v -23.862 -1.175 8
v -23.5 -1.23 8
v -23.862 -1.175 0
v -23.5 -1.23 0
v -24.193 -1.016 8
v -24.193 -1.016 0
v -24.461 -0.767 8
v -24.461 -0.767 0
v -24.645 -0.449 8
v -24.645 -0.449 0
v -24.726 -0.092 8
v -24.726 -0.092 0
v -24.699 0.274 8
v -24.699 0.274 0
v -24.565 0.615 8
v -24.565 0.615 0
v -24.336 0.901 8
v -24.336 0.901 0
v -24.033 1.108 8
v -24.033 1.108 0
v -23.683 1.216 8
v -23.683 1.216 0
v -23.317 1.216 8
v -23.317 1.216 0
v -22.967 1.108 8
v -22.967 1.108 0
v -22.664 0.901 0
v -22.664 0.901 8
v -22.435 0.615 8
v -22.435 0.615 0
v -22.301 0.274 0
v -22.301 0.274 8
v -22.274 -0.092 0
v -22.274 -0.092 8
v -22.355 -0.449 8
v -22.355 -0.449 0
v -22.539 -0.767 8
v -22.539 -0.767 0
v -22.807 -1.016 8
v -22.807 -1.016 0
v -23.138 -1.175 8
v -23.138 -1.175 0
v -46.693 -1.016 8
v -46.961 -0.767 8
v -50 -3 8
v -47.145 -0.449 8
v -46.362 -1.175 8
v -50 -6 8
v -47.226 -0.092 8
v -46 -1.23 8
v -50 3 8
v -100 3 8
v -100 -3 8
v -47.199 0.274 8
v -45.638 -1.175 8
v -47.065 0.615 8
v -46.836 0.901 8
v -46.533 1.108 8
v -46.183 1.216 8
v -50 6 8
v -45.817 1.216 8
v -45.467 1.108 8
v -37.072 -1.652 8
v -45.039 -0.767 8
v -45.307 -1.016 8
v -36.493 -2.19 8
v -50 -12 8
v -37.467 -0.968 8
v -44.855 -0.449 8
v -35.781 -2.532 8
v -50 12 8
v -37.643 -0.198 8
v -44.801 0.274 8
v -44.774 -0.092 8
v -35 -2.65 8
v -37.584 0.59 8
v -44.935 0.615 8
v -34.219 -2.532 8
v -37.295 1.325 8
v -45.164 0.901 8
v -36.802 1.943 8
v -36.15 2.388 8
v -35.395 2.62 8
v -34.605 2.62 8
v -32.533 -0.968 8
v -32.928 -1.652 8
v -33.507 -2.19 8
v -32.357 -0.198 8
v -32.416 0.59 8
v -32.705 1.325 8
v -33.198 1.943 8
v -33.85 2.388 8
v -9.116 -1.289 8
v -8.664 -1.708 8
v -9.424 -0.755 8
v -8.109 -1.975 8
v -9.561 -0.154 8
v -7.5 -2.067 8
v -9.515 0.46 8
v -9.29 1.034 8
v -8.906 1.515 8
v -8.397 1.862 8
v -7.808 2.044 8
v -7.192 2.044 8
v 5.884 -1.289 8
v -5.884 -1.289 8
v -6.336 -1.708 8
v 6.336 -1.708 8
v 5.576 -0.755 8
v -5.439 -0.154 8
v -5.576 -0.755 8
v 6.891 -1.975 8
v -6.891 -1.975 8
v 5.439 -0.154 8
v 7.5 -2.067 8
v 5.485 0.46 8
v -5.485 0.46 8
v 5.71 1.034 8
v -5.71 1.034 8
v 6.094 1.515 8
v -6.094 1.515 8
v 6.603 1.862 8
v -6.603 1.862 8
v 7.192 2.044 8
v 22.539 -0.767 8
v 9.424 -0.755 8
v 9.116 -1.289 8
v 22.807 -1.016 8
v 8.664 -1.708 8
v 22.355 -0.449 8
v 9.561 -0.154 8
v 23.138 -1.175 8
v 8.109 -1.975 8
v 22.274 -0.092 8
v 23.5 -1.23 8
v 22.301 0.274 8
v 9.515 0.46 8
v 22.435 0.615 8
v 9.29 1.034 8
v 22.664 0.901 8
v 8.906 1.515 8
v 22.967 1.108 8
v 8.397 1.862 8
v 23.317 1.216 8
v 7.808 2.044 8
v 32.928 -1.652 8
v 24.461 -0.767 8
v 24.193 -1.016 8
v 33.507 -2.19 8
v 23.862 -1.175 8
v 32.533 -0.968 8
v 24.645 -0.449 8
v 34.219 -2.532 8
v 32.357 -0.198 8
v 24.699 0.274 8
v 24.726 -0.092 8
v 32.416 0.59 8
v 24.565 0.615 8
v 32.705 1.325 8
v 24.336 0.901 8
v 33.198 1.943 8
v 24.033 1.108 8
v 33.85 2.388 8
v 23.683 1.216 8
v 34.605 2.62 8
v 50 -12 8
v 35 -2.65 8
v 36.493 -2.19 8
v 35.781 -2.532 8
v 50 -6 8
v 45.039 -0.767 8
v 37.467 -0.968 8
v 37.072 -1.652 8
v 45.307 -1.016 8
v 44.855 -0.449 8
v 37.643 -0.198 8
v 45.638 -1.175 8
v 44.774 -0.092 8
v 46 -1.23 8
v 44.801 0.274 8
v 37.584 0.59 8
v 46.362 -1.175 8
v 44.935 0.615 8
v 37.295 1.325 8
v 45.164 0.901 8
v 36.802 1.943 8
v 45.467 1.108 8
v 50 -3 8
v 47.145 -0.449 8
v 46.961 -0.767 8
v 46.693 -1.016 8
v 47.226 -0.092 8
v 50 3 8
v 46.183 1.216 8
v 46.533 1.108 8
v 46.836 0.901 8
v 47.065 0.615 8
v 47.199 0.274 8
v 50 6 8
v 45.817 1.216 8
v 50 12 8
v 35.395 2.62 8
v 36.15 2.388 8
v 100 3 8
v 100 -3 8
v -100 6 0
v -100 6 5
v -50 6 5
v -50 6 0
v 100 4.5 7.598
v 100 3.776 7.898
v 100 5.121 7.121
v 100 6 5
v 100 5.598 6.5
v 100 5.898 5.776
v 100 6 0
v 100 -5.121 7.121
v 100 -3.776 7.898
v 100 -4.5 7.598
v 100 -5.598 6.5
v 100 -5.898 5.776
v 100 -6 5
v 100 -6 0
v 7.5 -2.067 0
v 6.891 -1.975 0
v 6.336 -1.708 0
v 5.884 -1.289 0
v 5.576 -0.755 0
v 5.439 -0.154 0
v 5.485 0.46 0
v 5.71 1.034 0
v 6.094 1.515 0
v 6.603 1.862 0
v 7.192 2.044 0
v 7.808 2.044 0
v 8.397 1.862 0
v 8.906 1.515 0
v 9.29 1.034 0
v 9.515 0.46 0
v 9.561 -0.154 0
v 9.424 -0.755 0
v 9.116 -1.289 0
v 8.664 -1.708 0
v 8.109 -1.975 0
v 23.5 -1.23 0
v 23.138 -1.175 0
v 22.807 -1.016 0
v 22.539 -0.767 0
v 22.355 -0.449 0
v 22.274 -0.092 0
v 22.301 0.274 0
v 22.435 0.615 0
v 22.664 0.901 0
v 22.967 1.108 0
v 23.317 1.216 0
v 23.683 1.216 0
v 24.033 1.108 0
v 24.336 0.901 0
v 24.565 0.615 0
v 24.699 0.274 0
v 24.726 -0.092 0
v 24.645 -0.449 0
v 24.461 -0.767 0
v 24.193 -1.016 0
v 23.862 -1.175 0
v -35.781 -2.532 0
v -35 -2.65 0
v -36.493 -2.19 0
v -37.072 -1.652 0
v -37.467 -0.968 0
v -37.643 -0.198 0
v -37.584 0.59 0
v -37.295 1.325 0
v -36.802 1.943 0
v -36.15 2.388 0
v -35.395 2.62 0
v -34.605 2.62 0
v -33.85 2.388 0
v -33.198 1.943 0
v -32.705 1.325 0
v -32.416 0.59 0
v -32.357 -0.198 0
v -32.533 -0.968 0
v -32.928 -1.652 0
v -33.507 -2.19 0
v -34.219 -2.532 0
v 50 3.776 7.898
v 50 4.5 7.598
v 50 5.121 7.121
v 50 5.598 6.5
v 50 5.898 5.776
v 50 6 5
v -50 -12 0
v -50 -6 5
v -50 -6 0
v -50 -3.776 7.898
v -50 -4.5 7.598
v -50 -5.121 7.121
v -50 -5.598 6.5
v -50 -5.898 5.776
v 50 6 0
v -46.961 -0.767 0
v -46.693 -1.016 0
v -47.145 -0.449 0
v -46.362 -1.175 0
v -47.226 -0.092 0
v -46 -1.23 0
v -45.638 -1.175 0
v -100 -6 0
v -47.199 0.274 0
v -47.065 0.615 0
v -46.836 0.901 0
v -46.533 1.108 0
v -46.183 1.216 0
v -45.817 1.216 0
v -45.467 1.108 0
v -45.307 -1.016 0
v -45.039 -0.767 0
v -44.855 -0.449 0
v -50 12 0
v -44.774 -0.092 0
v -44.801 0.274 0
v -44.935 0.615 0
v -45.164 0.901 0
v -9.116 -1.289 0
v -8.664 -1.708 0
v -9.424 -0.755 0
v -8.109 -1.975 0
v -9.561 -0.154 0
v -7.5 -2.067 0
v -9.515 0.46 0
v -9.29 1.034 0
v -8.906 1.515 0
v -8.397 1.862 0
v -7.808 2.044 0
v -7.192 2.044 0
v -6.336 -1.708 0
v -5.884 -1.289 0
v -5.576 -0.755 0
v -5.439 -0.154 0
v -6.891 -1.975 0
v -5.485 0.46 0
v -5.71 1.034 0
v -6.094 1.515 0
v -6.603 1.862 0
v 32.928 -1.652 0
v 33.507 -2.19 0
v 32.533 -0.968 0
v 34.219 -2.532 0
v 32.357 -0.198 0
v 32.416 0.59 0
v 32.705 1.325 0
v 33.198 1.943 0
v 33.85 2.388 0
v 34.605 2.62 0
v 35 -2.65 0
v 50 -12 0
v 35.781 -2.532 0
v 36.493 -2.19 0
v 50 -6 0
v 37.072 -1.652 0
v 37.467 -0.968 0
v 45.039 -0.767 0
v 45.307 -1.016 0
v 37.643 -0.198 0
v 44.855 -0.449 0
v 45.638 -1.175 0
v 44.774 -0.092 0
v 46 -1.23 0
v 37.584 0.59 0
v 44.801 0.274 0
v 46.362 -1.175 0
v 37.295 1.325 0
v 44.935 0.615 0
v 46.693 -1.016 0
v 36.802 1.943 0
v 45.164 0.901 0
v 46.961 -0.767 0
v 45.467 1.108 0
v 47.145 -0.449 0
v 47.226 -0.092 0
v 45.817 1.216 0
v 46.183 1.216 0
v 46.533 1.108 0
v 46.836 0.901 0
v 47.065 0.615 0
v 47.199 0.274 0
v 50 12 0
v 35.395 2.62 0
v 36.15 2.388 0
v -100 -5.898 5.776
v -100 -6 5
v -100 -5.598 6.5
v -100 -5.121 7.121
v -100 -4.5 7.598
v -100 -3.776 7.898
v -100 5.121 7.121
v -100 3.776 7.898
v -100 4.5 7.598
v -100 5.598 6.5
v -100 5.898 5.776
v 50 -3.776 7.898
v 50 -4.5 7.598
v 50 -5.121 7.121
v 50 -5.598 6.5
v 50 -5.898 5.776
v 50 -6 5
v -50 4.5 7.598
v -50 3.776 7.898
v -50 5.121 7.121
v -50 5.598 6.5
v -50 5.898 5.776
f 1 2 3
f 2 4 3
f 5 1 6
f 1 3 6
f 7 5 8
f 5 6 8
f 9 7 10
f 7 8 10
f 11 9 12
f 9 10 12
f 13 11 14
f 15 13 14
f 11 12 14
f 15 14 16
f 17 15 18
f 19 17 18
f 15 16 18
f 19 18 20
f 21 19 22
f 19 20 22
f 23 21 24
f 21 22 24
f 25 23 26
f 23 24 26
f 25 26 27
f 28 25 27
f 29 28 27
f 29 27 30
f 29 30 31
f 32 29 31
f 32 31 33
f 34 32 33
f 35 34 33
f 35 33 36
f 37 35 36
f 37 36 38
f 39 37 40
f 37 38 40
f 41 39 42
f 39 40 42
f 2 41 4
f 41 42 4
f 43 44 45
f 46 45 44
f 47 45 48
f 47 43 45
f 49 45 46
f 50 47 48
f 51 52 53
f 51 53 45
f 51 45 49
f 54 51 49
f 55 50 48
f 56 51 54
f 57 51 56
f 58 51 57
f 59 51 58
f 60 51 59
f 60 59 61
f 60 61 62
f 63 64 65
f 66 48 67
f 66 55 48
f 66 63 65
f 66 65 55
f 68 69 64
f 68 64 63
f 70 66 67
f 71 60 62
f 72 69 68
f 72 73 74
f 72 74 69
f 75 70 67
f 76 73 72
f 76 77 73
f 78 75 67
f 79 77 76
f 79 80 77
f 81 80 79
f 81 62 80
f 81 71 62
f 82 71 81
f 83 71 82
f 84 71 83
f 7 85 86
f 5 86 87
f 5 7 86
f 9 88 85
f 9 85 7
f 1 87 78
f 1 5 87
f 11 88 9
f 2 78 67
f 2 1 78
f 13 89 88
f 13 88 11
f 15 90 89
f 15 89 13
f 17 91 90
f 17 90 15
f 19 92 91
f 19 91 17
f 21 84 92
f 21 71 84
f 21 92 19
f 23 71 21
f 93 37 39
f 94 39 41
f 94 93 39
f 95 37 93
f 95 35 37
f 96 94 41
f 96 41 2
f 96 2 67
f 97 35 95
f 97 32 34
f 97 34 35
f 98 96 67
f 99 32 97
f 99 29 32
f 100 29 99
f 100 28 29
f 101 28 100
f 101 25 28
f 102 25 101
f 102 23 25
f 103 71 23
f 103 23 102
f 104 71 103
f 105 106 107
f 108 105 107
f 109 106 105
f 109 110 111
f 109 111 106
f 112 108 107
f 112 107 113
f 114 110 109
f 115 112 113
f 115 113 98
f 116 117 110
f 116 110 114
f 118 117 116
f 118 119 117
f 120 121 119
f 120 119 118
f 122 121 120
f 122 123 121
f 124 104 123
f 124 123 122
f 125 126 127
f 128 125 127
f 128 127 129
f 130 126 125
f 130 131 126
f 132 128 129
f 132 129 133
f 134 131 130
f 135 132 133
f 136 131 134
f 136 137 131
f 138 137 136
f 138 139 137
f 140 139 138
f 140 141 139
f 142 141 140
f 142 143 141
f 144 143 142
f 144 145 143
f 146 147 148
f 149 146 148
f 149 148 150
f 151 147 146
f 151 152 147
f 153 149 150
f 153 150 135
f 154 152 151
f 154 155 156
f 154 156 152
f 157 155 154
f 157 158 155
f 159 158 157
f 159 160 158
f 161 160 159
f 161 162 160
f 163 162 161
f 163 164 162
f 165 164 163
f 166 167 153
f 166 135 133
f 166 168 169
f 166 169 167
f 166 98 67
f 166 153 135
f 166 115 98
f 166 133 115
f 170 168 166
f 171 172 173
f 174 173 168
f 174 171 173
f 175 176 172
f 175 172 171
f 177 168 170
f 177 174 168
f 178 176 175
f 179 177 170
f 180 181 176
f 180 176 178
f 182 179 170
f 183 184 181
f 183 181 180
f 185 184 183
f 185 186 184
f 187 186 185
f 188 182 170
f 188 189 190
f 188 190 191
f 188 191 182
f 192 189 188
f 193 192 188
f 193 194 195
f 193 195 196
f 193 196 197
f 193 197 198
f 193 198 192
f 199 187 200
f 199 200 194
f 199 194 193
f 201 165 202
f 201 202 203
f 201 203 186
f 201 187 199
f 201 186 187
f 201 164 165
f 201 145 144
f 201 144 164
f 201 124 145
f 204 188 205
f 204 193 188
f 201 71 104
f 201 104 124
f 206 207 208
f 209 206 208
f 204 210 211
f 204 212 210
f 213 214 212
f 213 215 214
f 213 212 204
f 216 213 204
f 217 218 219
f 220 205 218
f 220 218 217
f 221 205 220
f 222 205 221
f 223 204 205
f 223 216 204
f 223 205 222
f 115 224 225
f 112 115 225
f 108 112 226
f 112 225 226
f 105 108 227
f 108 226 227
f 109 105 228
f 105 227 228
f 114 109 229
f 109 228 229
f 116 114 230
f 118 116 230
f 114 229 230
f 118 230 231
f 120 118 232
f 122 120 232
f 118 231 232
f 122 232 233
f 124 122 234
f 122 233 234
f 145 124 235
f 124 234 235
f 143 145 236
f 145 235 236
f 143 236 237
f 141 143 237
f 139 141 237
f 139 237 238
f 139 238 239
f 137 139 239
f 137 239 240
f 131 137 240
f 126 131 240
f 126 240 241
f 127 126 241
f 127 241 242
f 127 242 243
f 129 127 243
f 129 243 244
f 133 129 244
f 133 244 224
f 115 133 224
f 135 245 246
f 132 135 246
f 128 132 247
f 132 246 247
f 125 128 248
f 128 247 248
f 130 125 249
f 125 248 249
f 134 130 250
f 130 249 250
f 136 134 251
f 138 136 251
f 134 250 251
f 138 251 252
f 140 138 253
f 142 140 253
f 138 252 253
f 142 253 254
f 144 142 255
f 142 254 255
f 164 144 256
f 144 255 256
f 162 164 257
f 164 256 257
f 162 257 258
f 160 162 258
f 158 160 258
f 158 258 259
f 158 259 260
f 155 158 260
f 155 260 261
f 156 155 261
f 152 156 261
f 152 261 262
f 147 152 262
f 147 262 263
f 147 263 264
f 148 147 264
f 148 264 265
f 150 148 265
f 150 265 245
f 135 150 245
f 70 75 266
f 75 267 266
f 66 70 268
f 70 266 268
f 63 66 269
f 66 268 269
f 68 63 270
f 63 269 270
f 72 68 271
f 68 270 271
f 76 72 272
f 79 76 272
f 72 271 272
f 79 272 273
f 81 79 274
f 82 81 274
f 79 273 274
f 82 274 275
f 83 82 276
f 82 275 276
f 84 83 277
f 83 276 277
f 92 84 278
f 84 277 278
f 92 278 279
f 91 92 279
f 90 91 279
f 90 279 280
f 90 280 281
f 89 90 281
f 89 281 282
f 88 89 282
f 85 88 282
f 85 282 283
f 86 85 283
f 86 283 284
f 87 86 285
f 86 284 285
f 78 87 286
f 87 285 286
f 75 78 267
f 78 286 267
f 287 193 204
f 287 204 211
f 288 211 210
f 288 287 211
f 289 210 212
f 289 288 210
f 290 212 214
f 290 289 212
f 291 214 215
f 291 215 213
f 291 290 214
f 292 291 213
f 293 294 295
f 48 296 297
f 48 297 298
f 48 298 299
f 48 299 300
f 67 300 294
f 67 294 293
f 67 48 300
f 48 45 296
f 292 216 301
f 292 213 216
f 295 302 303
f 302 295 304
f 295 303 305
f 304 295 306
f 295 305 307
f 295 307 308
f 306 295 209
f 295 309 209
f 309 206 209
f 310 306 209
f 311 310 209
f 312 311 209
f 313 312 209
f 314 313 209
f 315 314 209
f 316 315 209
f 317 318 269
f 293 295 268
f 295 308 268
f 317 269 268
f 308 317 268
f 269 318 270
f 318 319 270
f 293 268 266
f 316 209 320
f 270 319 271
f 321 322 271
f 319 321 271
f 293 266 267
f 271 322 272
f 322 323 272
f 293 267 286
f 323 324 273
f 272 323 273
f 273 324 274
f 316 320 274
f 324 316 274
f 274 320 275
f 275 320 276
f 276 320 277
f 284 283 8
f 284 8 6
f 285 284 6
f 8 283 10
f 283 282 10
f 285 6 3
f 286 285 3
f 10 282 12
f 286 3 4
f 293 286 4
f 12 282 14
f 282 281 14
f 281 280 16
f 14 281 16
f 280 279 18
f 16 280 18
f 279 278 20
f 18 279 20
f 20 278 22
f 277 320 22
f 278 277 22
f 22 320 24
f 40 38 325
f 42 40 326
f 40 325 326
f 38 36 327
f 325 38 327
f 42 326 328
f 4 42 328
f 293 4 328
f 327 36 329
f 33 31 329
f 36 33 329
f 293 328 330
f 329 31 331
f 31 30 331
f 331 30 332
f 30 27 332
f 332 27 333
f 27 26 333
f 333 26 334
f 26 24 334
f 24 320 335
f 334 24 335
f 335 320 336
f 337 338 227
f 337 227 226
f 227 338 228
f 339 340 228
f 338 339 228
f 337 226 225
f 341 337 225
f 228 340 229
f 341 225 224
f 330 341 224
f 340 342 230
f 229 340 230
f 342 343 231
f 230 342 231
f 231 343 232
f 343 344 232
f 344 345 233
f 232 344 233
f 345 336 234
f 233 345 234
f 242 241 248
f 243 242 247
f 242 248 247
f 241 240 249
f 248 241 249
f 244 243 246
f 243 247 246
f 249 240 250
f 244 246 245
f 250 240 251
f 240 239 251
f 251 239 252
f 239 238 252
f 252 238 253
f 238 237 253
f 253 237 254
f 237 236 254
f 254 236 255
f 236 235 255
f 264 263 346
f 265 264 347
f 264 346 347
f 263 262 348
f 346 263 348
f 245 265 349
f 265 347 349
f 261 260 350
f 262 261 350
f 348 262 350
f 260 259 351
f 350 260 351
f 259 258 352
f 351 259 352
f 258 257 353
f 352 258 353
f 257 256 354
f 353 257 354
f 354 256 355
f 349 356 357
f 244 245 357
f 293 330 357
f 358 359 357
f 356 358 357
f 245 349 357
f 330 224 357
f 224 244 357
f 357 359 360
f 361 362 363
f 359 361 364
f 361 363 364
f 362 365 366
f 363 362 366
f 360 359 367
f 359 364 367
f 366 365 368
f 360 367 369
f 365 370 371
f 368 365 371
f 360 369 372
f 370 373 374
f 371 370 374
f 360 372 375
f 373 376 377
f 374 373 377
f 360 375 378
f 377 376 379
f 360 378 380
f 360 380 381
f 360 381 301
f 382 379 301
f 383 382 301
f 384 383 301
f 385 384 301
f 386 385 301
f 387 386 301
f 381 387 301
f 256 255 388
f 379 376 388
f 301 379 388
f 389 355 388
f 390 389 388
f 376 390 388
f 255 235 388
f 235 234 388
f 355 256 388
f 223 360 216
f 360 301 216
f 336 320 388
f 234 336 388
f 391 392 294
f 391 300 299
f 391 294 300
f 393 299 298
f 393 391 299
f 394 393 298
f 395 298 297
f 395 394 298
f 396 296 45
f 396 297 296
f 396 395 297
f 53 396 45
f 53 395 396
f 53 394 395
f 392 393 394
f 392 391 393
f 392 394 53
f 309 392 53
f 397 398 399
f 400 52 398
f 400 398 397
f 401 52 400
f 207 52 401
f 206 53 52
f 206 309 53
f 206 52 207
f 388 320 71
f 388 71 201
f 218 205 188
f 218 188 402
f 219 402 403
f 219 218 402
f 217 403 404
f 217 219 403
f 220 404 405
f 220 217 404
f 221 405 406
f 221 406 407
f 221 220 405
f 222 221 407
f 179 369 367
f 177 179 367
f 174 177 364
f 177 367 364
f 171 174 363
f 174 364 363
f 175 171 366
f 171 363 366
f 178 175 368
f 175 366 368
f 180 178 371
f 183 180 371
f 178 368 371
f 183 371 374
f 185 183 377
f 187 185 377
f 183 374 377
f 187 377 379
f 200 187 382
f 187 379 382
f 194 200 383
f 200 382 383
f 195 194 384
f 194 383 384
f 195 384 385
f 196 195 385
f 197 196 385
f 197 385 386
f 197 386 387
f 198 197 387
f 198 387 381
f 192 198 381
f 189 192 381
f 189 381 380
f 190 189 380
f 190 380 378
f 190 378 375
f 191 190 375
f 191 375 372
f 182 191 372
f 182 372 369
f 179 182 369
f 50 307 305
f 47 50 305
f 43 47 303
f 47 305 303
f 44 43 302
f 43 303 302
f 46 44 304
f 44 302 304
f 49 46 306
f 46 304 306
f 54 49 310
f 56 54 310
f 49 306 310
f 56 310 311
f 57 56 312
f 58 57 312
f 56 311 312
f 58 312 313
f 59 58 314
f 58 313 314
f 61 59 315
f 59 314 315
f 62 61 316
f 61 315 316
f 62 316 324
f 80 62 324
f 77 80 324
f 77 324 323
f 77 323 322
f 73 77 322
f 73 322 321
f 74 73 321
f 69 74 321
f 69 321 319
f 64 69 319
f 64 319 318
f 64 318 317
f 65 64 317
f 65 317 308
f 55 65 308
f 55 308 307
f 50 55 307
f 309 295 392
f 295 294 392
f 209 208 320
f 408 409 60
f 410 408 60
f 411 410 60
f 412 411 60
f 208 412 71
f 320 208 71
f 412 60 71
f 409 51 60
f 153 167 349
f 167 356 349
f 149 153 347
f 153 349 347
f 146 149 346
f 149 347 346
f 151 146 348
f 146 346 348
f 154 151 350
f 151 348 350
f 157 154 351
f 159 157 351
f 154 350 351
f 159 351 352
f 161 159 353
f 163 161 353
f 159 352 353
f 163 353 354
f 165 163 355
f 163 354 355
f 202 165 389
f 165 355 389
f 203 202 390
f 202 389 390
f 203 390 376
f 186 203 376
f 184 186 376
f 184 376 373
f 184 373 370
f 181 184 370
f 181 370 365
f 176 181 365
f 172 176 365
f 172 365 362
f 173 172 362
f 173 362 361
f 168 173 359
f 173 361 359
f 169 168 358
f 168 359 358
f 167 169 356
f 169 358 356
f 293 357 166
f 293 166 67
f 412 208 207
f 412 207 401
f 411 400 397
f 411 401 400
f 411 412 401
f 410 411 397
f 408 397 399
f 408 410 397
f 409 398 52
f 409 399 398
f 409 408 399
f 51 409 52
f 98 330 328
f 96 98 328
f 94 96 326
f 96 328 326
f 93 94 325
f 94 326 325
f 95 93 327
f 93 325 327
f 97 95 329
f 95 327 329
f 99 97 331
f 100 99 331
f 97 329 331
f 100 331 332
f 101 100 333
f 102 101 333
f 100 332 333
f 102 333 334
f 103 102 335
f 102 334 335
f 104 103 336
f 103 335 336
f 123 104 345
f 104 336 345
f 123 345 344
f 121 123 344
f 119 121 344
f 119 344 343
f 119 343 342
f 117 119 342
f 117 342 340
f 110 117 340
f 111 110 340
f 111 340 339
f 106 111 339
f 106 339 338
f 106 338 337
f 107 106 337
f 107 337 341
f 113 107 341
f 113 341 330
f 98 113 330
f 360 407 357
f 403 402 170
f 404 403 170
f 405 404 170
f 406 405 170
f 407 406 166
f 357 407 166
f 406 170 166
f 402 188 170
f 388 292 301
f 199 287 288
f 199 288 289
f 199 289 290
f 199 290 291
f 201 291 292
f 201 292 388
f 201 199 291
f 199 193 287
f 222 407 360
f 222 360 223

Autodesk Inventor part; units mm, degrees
ref_plane "YZ Plane" through (0, 0, 0) normal (1, 0, 0) x (0, 1, 0)
ref_plane "XZ Plane" through (0, 0, 0) normal (0, 1, 0) x (-1, 0, 0)
ref_plane "XY Plane" through (0, 0, 0) normal (0, 0, 1) x (1, 0, 0)
sketch "Sketch1" plane through (0, 0, 0) normal (0, 0, 1) x (1, 0, 0)
  line L0 (0, 20.1746) -> (0, -21.4461) construction
  line L1 (-20.2028, 0) -> (20.1685, 0) construction
  line L2 (-100, 12) -> (100, 12)
  line L3 (100, 12) -> (100, -12)
  line L4 (100, -12) -> (-100, -12)
  line L5 (-100, -12) -> (-100, 12)
  point P0 (0, 0)
  dimension "d0" = 24
  dimension "d1" = 12
  dimension "d2" = 200
  dimension "d3" = 100
extrude "Extrusion1" add sketch "Sketch1" along normal blind 8
fillet "Fillet1" [suppressed]
chamfer "Chamfer1" [suppressed]
sketch "Skizze2" plane through (0, 0, 8) normal (0, 0, 1) x (1, 0, 0)
  line L0 (-7.5, 0) -> (7.5, 0)
  point P0 (0, 0)
  point P1 (0, 0)
  dimension "d12" = 15
sketch "Skizze3" plane through (0, 0, 8) normal (0, 0, 1) x (1, 0, 0)
  line L0 (-35, 0) -> (35, 0) construction
  point P0 (0, 0)
  point P1 (0, 0)
  dimension "d13" = 70
hole "Bohrung1" at (-35, 0, 8) at (35, 0, 8) direction (0, 0, -1) diameter 5.3 end through all clearance for "Sechskantkopfschraube" size "M5" standard "ANSI Metrisches M Profil"
hole "Bohrung2" at (-7.5, 0, 8) at (7.5, 0, 8) direction (0, 0, -1) diameter 4.134 end through all thread size "M5x0.8" class "6H" standard "ANSI Metric M Profile"
sketch "Skizze4" plane through (0, 0, 8) normal (0, 0, 1) x (1, 0, 0)
  circle A0 centre (-46, 0) radius 1.6 projected
  circle A1 centre (-23.5, 0) radius 1.6 projected
  circle A2 centre (46, 0) radius 1.6 projected
  circle A3 centre (23.5, 0) radius 1.6 projected
  point P0 (0, 0)
hole "Bohrung3" at (23.5, 0, 8) at (46, 0, 8) at (-23.5, 0, 8) at (-46, 0, 8) direction (0, 0, -1) diameter 2.459 end through all thread size "M3x0.5" class "6H" standard "ANSI Metric M Profile"
sketch "Skizze5" plane through (0, 0, 8) normal (0, 0, 1) x (1, 0, 0)
  line L0 (-100, 6) -> (-50, 6)
  line L1 (-50, 6) -> (-50, -6)
  line L2 (-50, -6) -> (-100, -6)
  line L3 (-100, -6) -> (-100, 6)
  line L4 (-100, 12) -> (-100, -12) projected
  line L5 (-50, -6) -> (-50, -12)
  line L6 (-50, 6) -> (-50, 12)
  line L7 (100, 12) -> (-100, 12) projected
  line L8 (-50, 12) -> (-100, 12)
  line L9 (-100, -12) -> (100, -12) projected
  line L10 (-50, -12) -> (-100, -12)
  line L11 (0, 12) -> (0, -12)
  line L12 (100, 6) -> (50, 6)
  line L13 (50, 6) -> (50, -6)
  line L14 (50, -6) -> (100, -6)
  line L15 (100, -6) -> (100, 6)
  line L16 (100, 12) -> (100, -12)
  line L17 (50, -6) -> (50, -12)
  line L18 (50, 6) -> (50, 12)
  line L19 (50, 12) -> (100, 12)
  line L20 (50, -12) -> (100, -12)
  point P0 (0, 0)
  point P1 (-100, 0)
  point P2 (-100, 6)
  point P3 (100, 0)
  point P4 (50, -12)
  point P5 (50, 12)
  dimension "d35" = 50
  dimension "d36" = 12
extrude "Extrusion2" cut sketch "Skizze5" against normal through all contours L4 L7 L6 L0 | L2 L5 L9 L4 | L7 L16 L12 L18 | L17 L14 L16 L9
fillet "Rundung2" radius 3 4 edges at (-75, -6, 8) (-75, 6, 8) (75, 6, 8) (75, -6, 8)
equation "\"d0\" = height"
equation "\"d1\" = 0.5 * height"
equation "\"d2\" = width"
equation "\"d3\" = 0.5 * width"
equation "\"d4\" = thickness"
equation "\"fillet\" = 0"
equation "\"chamfer\" = 0"
equation "\"thickness\" = 8"
equation "\"width\" = 200"
equation "\"height\" = 24"
properties part number "Platte Scharfe Ecken (mm) 150 x 30 x 8" material "Stahl, weich, Feste-Einspannung"
